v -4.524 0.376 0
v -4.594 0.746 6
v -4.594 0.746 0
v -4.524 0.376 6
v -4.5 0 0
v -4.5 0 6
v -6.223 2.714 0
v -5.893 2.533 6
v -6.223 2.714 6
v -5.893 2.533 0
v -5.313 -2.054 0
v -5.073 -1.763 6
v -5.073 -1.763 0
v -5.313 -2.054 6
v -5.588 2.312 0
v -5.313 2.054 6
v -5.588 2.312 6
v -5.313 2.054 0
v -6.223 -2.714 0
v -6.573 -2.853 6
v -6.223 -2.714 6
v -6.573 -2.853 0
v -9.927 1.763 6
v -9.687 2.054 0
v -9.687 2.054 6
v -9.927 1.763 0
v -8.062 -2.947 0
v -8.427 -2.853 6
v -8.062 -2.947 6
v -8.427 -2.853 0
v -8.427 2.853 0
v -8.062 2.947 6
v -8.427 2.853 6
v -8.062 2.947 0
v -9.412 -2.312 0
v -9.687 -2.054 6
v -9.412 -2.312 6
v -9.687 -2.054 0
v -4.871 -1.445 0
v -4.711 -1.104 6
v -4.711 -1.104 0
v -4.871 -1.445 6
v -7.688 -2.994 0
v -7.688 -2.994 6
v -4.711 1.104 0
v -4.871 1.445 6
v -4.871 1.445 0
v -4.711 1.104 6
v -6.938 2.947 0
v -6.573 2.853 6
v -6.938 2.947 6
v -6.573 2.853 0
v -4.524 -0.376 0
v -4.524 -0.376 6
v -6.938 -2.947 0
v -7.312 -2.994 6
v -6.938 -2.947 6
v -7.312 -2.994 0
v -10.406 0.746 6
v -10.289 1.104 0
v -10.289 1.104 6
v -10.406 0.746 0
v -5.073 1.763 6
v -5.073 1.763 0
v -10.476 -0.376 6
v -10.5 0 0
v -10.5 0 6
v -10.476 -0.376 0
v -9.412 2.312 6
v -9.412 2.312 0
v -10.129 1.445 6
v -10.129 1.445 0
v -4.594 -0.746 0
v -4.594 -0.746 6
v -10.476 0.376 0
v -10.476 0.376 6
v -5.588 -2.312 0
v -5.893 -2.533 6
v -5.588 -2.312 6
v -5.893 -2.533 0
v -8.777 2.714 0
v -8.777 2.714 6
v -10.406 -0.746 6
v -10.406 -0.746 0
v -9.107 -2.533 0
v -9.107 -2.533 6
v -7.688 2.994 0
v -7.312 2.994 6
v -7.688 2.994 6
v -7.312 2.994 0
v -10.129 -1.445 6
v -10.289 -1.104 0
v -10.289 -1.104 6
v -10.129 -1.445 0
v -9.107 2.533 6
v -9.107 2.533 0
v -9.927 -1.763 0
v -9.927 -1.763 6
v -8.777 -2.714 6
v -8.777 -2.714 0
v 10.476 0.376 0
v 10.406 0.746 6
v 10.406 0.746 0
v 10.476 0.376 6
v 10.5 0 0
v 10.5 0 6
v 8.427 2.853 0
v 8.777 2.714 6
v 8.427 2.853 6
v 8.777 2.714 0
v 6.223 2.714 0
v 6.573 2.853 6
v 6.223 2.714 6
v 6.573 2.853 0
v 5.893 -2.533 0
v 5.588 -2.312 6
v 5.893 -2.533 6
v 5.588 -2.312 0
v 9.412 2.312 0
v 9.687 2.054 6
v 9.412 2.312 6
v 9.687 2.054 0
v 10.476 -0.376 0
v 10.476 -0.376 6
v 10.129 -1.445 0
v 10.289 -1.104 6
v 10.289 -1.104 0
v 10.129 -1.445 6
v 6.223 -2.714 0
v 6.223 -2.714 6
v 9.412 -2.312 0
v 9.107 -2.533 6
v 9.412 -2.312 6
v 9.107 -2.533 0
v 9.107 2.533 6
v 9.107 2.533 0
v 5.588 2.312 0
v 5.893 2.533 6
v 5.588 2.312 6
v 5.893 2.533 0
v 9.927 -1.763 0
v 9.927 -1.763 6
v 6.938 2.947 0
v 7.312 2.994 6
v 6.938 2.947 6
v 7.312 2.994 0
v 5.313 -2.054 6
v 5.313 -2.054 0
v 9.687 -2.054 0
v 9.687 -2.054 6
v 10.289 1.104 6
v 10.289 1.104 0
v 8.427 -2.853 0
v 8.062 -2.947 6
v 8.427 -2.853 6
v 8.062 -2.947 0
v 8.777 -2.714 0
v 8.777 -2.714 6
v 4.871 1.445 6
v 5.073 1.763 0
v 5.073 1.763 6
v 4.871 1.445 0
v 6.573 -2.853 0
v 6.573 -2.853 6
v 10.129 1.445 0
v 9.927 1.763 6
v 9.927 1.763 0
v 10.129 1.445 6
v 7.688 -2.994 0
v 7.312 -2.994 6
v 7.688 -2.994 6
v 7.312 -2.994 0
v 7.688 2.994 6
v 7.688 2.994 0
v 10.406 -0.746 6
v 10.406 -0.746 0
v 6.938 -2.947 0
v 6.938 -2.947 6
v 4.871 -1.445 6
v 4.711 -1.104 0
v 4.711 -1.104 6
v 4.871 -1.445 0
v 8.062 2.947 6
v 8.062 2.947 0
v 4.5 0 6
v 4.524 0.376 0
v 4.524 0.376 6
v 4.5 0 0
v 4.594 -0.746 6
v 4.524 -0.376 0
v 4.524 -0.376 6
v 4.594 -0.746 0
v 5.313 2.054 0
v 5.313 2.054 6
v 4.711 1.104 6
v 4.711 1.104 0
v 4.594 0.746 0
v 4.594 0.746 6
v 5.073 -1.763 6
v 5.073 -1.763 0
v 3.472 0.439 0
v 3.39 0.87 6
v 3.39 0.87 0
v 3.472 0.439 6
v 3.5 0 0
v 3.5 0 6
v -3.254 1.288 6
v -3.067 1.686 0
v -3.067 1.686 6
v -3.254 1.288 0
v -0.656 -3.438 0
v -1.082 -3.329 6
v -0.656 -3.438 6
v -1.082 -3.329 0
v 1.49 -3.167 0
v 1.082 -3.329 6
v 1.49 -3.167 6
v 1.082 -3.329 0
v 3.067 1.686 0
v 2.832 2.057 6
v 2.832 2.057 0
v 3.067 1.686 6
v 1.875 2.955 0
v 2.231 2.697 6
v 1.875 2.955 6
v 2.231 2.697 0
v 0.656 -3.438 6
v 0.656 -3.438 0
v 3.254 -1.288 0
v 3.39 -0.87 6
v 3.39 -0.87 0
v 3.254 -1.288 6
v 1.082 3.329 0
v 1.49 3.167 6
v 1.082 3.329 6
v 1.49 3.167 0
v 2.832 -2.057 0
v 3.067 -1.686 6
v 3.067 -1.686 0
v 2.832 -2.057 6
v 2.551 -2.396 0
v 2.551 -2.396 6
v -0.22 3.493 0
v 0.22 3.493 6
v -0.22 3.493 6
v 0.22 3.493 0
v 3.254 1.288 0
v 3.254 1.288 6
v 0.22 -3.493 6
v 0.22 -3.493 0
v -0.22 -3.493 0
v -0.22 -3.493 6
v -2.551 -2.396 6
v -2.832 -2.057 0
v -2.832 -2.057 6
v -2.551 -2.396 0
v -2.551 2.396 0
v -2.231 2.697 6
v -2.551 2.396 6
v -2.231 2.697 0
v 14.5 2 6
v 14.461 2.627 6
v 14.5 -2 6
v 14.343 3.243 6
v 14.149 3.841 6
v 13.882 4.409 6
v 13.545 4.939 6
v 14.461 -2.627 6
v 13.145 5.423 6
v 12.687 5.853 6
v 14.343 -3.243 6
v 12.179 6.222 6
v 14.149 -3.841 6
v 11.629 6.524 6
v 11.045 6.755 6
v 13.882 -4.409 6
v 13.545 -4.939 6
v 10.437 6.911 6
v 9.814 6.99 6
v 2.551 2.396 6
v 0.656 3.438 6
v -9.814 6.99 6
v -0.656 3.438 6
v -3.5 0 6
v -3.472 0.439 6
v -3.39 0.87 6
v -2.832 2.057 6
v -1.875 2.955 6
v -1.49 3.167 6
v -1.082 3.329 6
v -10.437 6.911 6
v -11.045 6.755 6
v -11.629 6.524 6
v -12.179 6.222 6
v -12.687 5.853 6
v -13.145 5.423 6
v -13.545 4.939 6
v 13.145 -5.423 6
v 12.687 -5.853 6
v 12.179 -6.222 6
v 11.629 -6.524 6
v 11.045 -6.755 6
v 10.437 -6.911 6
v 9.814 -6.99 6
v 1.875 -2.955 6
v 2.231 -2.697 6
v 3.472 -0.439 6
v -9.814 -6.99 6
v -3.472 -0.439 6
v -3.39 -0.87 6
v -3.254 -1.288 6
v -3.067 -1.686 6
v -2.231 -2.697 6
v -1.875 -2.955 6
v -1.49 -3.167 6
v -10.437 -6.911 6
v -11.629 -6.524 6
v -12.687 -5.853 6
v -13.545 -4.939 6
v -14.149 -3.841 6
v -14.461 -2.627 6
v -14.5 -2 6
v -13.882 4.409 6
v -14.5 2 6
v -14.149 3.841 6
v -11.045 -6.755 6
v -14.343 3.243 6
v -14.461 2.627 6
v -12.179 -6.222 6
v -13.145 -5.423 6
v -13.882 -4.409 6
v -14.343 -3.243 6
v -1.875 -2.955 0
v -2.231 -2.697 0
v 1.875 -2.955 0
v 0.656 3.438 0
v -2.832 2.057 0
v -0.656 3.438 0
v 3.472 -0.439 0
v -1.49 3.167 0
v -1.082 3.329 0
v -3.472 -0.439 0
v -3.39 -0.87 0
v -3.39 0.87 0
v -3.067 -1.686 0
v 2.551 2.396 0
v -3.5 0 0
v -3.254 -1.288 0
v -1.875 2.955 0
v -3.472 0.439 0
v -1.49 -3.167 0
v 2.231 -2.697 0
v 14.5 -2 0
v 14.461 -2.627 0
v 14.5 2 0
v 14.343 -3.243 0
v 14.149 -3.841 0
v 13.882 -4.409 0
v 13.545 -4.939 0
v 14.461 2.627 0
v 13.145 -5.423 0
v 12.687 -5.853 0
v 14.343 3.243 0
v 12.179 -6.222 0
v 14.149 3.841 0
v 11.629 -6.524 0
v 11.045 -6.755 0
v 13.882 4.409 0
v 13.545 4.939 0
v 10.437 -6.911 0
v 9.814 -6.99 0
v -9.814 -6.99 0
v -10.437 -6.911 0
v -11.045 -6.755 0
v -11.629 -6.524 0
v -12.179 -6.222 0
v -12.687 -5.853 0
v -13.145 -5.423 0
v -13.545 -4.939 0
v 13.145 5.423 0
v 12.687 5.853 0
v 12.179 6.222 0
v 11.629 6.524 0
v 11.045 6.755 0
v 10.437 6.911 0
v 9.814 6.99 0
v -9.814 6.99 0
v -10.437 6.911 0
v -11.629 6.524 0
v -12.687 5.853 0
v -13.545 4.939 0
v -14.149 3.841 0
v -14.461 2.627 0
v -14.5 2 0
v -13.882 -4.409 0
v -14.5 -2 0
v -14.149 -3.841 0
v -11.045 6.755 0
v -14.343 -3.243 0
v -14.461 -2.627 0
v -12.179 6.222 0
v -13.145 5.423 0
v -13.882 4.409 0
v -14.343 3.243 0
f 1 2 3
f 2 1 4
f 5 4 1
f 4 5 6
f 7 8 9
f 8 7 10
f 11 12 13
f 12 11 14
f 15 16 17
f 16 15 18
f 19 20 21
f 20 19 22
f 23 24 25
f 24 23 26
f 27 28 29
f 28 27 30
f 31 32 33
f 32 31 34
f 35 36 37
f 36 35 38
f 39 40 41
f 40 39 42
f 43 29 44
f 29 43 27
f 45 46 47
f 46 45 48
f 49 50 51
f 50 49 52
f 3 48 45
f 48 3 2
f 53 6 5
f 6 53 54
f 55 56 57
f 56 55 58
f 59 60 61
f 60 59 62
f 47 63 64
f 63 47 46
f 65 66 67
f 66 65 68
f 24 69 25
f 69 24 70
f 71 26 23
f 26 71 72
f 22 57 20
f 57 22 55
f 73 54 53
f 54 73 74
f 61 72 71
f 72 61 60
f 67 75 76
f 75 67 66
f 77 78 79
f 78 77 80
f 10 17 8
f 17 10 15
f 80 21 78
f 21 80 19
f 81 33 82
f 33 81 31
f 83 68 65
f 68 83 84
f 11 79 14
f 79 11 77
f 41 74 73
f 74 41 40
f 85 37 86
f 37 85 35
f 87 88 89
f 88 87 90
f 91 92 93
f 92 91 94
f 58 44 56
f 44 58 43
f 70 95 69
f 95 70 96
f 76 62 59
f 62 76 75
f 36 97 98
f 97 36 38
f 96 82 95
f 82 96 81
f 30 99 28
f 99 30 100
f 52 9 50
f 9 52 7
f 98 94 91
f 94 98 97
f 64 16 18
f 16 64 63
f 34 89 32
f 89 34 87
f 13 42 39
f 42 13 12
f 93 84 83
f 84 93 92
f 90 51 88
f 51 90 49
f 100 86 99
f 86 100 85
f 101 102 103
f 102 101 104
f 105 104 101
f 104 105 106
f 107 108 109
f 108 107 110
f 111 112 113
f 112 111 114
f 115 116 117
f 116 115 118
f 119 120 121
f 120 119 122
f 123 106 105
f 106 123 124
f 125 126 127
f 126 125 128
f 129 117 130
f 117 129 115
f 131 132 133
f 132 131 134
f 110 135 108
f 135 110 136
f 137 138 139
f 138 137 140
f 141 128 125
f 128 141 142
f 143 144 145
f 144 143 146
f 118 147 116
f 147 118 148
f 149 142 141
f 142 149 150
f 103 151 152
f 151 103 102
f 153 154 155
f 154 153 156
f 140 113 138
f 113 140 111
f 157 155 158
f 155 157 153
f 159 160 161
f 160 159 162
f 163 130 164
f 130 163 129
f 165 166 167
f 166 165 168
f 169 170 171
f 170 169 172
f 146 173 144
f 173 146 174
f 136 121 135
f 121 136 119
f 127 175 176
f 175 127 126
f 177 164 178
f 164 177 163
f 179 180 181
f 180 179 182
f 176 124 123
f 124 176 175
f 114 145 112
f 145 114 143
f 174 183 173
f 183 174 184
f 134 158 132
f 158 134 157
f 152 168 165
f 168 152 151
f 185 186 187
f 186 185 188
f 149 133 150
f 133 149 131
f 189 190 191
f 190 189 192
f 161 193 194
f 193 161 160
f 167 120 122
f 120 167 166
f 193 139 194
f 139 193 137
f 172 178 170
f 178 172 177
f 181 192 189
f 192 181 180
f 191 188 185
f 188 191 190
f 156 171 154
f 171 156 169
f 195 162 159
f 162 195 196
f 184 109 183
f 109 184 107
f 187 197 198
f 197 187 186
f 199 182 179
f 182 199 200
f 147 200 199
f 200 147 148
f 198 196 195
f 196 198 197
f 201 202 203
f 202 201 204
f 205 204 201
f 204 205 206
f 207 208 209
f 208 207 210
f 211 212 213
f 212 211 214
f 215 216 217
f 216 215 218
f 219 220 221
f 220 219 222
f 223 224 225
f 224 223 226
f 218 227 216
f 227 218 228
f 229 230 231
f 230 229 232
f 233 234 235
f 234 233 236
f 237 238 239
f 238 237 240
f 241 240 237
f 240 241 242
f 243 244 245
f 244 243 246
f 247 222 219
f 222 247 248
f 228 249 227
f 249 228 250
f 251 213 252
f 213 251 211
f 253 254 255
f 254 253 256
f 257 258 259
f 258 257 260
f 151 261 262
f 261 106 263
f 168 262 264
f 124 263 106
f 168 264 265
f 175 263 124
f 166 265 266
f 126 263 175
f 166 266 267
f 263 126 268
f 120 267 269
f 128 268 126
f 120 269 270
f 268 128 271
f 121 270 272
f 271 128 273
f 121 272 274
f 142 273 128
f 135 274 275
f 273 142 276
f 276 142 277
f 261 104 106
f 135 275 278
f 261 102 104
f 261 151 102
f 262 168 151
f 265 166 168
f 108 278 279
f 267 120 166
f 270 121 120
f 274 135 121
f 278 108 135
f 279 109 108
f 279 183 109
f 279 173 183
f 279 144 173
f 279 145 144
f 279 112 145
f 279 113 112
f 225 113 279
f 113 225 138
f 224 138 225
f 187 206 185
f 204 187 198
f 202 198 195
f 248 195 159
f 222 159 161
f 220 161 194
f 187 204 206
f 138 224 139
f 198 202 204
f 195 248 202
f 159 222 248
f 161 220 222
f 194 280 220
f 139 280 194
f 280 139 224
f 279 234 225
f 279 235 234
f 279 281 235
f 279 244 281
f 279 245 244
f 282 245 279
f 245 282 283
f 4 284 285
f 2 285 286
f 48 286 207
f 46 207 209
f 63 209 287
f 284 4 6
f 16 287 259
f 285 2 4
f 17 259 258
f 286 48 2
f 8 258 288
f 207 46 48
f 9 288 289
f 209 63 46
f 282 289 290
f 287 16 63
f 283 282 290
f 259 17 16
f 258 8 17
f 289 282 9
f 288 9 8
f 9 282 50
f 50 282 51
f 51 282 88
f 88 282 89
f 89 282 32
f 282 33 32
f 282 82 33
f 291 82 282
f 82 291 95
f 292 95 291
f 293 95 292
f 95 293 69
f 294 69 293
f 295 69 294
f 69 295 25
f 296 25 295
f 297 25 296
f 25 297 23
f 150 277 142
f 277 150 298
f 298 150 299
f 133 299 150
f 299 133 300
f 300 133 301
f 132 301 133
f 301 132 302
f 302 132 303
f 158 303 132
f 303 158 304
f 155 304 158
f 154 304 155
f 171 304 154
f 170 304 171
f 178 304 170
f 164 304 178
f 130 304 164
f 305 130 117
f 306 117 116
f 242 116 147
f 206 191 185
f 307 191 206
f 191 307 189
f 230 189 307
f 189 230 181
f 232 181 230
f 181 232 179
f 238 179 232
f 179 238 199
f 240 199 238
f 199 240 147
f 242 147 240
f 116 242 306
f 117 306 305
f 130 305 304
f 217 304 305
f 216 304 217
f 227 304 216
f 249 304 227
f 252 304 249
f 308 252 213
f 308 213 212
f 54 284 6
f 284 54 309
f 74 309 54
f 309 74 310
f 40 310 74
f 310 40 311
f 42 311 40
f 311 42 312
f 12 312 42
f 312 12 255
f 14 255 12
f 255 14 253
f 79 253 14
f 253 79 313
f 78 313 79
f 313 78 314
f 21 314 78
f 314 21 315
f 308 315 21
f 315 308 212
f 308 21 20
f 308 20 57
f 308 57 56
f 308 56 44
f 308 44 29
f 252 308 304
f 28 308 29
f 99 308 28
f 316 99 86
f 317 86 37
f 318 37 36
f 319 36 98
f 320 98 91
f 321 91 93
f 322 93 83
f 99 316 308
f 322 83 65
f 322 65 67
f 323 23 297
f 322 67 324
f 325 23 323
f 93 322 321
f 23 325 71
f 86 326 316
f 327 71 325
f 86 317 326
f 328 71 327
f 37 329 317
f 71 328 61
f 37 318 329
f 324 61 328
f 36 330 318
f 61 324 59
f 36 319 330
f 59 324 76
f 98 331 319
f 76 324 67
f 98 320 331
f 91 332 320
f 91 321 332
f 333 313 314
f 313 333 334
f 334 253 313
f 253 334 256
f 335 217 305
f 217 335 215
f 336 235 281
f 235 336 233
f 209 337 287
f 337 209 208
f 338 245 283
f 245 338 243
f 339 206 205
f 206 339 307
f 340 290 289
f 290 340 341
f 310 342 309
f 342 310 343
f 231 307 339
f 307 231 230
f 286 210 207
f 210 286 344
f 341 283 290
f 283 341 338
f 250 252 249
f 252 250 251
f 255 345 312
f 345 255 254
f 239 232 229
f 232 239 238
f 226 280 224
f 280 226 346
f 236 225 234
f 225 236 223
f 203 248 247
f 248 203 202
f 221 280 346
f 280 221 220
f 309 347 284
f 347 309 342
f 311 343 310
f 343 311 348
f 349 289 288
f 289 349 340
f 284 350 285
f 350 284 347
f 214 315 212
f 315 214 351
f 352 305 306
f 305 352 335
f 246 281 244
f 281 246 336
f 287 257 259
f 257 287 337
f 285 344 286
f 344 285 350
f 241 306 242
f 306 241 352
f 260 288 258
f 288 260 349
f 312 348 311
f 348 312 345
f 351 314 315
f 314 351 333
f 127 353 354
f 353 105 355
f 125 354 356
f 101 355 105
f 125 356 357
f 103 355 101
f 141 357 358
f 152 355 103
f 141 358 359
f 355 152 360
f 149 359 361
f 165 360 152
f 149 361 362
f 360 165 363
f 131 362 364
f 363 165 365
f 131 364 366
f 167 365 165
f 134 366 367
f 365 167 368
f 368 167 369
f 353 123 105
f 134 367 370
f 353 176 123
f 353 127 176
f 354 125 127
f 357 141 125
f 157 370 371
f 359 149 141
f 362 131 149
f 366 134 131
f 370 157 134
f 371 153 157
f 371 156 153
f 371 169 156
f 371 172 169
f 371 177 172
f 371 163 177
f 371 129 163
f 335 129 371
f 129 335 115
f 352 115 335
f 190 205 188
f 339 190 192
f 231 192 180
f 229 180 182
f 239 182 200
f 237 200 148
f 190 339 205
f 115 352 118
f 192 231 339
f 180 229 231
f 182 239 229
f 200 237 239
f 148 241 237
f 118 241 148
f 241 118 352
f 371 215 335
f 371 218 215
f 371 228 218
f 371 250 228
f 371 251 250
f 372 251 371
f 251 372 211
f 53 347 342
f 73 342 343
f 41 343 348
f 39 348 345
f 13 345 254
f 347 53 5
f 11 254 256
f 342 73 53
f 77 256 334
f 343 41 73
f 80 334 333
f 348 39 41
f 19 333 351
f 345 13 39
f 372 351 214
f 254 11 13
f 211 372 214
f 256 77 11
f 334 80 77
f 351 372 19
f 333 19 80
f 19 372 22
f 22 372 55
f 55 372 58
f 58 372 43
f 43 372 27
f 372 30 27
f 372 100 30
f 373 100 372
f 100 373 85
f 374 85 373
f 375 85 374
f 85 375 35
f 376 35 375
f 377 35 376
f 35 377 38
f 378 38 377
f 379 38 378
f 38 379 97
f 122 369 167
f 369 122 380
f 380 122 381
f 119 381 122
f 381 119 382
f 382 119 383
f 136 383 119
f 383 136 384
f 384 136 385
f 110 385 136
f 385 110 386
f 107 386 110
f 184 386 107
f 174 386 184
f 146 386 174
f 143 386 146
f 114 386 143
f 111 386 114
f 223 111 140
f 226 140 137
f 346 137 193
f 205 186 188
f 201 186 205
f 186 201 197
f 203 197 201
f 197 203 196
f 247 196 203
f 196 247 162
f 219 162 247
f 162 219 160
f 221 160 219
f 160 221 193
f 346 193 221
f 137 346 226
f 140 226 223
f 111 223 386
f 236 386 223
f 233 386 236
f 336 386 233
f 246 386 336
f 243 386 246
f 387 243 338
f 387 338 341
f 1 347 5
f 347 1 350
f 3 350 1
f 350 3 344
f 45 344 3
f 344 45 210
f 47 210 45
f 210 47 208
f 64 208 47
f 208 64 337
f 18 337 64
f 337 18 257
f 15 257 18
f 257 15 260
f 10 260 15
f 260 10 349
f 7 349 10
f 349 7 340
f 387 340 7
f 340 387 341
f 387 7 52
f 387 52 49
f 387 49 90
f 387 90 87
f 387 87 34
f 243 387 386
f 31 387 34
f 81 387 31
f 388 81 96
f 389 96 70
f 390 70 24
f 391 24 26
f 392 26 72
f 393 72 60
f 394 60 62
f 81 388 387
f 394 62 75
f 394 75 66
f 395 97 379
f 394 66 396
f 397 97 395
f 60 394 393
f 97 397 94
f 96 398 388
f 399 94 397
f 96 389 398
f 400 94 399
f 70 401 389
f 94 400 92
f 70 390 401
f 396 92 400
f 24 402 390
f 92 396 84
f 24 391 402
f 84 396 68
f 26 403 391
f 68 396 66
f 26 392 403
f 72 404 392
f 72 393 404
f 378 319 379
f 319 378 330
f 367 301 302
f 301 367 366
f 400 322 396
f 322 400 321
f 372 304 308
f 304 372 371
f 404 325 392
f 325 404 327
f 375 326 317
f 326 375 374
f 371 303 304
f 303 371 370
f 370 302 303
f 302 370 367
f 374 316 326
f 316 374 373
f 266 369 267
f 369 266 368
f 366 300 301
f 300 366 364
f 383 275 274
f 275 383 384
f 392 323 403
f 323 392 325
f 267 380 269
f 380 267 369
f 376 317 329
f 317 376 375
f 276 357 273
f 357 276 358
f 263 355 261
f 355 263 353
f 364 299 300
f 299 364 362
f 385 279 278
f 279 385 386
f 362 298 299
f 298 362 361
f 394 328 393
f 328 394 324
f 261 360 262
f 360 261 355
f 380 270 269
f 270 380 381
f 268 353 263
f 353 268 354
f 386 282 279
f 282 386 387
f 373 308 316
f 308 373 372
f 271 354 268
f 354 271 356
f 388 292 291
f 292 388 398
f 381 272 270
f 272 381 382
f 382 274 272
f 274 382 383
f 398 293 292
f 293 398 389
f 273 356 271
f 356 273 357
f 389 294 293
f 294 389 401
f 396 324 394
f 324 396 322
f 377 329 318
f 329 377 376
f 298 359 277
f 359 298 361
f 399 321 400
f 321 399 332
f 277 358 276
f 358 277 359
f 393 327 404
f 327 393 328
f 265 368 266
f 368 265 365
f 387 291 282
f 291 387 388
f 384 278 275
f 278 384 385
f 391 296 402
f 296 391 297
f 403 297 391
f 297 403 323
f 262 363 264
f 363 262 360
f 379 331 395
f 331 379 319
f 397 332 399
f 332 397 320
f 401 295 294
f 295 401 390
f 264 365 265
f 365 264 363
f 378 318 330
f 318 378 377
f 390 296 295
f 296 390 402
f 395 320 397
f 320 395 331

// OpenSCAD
$fn = 50;


difference() {
	union() {
		hull() {
			translate(v = [-9.5000000000, 2.0000000000, 0]) {
				cylinder(h = 6, r = 5);
			}
			translate(v = [9.5000000000, 2.0000000000, 0]) {
				cylinder(h = 6, r = 5);
			}
			translate(v = [-9.5000000000, -2.0000000000, 0]) {
				cylinder(h = 6, r = 5);
			}
			translate(v = [9.5000000000, -2.0000000000, 0]) {
				cylinder(h = 6, r = 5);
			}
		}
	}
	union() {
		#translate(v = [-7.5000000000, 0.0000000000, 0]) {
			cylinder(h = 6, r = 3.0000000000);
		}
		#translate(v = [7.5000000000, 0.0000000000, 0]) {
			cylinder(h = 6, r = 3.0000000000);
		}
		#translate(v = [-7.5000000000, 0.0000000000, -100.0000000000]) {
			cylinder(h = 200, r = 3.0000000000);
		}
		#translate(v = [-7.5000000000, 0.0000000000, -100.0000000000]) {
			cylinder(h = 200, r = 3.0000000000);
		}
		#translate(v = [7.5000000000, 0.0000000000, -100.0000000000]) {
			cylinder(h = 200, r = 3.0000000000);
		}
		#translate(v = [7.5000000000, 0.0000000000, -100.0000000000]) {
			cylinder(h = 200, r = 3.0000000000);
		}
		#translate(v = [-7.5000000000, 0.0000000000, 0]) {
			cylinder(h = 6, r = 1.5000000000);
		}
		#translate(v = [7.5000000000, 0.0000000000, 0]) {
			cylinder(h = 6, r = 1.5000000000);
		}
		#translate(v = [-7.5000000000, 0.0000000000, 0]) {
			cylinder(h = 6, r = 1.5000000000);
		}
		#translate(v = [7.5000000000, 0.0000000000, 0]) {
			cylinder(h = 6, r = 1.5000000000);
		}
		#translate(v = [-7.5000000000, 0.0000000000, 0]) {
			cylinder(h = 6, r = 1.5000000000);
		}
		#translate(v = [7.5000000000, 0.0000000000, 0]) {
			cylinder(h = 6, r = 1.5000000000);
		}
		#cylinder(h = 6, r = 3.5000000000);
	}
}
